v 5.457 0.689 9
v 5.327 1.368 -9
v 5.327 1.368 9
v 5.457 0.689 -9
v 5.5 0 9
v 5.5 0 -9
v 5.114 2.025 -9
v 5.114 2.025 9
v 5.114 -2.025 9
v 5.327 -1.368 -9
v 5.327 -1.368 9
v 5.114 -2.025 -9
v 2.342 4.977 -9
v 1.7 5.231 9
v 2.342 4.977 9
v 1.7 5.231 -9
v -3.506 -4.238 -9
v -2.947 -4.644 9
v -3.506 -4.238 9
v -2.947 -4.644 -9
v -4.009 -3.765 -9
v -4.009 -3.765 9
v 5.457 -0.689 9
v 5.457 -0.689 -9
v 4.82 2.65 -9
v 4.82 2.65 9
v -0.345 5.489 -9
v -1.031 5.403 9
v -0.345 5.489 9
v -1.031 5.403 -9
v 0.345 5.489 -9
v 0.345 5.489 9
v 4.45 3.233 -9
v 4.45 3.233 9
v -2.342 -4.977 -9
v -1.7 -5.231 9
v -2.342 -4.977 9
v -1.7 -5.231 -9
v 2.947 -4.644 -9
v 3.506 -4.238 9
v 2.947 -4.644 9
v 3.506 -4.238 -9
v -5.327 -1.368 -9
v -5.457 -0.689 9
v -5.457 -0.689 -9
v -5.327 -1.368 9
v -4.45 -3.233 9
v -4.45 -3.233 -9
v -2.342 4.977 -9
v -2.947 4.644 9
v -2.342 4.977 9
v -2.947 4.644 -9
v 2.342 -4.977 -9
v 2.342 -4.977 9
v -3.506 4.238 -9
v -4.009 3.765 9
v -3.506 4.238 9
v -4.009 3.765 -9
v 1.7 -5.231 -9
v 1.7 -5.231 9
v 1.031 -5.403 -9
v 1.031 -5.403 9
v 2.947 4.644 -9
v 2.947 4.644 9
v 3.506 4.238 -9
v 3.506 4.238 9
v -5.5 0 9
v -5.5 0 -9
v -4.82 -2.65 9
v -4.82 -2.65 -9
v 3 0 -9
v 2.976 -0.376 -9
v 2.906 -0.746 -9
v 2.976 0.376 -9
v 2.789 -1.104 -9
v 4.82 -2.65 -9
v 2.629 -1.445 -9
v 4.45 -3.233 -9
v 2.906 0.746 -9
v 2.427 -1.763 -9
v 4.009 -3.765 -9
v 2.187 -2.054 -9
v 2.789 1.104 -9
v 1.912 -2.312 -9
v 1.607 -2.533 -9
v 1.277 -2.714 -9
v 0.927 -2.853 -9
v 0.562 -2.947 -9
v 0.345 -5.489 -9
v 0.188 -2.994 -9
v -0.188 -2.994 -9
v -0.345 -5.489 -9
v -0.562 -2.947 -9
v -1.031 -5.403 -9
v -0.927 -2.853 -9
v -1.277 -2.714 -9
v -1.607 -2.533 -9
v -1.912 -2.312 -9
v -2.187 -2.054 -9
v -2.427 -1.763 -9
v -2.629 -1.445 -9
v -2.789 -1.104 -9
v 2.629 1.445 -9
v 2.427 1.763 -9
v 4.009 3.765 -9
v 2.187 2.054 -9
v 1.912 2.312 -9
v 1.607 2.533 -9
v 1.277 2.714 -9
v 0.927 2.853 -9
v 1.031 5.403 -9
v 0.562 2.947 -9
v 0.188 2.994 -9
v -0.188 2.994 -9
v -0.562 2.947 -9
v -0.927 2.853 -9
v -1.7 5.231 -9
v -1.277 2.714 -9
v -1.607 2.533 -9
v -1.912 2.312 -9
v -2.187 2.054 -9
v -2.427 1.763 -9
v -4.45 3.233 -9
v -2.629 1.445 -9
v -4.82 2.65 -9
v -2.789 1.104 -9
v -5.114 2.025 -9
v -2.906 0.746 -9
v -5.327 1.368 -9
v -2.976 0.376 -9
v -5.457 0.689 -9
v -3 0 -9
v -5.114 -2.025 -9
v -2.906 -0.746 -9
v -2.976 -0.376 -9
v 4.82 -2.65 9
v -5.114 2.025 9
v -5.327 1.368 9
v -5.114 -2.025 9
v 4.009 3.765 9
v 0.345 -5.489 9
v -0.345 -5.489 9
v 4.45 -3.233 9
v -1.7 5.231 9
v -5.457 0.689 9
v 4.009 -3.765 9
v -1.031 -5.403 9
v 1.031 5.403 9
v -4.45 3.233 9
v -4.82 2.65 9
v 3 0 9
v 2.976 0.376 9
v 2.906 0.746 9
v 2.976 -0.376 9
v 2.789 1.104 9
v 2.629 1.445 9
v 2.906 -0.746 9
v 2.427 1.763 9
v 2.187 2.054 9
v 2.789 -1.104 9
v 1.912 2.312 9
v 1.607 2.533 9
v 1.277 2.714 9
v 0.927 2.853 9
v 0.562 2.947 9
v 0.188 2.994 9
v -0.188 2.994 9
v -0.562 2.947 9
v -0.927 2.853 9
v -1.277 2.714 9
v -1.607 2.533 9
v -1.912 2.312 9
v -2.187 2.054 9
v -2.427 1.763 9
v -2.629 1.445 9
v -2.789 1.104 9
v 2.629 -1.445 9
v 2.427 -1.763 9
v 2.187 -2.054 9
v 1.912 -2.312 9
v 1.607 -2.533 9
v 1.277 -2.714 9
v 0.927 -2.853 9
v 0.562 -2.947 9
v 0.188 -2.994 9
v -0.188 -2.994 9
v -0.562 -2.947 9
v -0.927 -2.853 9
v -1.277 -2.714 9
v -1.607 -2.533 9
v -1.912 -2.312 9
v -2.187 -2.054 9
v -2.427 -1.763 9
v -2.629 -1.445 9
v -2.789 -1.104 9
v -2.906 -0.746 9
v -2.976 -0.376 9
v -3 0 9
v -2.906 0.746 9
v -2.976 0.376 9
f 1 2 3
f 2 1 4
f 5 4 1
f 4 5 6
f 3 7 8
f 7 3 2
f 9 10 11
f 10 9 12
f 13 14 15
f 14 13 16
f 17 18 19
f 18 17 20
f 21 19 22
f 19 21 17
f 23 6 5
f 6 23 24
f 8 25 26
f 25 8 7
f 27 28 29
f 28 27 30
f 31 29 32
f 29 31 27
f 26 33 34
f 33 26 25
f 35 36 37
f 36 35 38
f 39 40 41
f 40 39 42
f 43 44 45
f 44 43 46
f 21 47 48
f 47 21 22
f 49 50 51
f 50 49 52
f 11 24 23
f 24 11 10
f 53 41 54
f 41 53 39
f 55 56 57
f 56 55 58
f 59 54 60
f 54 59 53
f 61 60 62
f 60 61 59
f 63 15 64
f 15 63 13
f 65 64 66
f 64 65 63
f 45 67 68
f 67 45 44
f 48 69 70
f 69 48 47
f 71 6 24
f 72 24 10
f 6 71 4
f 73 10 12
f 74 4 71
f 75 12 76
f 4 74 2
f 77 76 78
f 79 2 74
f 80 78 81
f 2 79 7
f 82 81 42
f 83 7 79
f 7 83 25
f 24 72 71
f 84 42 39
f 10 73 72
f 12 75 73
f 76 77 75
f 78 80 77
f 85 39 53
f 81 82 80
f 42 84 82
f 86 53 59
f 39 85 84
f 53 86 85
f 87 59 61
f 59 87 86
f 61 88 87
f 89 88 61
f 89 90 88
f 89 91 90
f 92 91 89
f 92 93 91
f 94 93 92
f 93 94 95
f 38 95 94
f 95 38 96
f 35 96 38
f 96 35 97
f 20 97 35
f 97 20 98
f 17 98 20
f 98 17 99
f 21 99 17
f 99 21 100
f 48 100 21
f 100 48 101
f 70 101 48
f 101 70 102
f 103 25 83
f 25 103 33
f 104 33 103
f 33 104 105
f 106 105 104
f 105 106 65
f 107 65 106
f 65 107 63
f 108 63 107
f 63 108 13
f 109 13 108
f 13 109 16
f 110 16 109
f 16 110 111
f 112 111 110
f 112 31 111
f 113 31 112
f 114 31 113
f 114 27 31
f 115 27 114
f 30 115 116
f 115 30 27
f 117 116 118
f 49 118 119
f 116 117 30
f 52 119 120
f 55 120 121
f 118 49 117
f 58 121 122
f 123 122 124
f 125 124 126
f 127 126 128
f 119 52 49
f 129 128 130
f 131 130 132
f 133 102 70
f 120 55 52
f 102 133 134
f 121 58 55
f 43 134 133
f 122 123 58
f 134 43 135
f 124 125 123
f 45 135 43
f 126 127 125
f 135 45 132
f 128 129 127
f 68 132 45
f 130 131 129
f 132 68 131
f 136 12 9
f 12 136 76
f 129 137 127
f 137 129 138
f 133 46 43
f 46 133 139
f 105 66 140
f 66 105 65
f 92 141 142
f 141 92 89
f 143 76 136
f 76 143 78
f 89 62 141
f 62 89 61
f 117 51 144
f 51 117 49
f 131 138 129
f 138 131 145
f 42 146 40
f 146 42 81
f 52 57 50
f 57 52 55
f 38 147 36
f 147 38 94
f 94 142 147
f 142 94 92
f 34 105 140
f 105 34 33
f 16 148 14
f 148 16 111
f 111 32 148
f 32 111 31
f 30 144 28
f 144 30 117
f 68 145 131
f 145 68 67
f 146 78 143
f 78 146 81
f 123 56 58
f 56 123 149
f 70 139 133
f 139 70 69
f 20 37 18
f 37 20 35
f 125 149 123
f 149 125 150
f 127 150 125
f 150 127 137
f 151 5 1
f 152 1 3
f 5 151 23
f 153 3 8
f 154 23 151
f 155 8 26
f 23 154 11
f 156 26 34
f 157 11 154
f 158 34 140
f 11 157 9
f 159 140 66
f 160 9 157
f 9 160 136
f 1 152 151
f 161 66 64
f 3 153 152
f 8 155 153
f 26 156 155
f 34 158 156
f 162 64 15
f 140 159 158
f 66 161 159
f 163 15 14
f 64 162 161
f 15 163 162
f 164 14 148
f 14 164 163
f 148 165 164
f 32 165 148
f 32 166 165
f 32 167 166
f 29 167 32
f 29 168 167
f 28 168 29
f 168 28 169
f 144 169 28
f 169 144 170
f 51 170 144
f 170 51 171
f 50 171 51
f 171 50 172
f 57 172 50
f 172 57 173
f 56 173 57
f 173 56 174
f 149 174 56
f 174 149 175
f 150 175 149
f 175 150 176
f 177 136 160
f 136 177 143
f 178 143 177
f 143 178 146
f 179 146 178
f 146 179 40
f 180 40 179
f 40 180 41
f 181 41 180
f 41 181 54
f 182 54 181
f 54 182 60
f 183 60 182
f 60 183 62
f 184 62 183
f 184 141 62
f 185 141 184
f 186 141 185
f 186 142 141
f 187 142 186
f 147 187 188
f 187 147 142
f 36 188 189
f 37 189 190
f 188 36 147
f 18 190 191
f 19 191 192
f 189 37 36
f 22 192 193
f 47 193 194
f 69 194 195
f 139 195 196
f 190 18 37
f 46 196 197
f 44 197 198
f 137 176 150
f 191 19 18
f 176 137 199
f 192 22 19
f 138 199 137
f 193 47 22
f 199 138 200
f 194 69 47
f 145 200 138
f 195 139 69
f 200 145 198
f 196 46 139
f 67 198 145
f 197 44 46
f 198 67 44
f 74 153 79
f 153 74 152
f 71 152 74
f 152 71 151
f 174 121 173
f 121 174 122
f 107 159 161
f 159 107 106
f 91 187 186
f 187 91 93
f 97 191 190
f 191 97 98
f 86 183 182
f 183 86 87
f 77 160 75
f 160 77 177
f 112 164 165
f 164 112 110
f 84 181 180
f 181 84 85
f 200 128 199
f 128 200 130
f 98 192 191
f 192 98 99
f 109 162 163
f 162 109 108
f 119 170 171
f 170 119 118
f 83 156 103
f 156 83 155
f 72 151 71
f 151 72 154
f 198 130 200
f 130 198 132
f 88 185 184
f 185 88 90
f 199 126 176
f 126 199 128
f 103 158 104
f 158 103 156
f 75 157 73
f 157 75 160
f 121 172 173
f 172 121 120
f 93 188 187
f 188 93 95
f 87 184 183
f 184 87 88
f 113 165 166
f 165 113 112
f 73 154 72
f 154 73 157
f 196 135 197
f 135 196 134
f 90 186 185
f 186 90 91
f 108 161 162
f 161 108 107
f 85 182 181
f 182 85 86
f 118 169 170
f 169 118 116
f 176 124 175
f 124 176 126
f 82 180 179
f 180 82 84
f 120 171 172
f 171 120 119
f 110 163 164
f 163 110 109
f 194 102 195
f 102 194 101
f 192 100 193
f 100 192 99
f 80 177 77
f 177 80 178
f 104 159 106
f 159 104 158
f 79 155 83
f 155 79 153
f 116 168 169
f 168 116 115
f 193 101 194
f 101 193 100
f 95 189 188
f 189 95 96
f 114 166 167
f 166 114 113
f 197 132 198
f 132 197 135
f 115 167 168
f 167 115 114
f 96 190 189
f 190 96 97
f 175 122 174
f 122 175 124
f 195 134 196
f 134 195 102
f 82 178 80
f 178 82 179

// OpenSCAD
$fn = 50;


difference() {
	union() {
		translate(v = [0, 0, -9.0000000000]) {
			cylinder(h = 18, r = 5.5000000000);
		}
	}
	union() {
		translate(v = [0, 0, -100.0000000000]) {
			cylinder(h = 200, r = 3.0000000000);
		}
	}
}
